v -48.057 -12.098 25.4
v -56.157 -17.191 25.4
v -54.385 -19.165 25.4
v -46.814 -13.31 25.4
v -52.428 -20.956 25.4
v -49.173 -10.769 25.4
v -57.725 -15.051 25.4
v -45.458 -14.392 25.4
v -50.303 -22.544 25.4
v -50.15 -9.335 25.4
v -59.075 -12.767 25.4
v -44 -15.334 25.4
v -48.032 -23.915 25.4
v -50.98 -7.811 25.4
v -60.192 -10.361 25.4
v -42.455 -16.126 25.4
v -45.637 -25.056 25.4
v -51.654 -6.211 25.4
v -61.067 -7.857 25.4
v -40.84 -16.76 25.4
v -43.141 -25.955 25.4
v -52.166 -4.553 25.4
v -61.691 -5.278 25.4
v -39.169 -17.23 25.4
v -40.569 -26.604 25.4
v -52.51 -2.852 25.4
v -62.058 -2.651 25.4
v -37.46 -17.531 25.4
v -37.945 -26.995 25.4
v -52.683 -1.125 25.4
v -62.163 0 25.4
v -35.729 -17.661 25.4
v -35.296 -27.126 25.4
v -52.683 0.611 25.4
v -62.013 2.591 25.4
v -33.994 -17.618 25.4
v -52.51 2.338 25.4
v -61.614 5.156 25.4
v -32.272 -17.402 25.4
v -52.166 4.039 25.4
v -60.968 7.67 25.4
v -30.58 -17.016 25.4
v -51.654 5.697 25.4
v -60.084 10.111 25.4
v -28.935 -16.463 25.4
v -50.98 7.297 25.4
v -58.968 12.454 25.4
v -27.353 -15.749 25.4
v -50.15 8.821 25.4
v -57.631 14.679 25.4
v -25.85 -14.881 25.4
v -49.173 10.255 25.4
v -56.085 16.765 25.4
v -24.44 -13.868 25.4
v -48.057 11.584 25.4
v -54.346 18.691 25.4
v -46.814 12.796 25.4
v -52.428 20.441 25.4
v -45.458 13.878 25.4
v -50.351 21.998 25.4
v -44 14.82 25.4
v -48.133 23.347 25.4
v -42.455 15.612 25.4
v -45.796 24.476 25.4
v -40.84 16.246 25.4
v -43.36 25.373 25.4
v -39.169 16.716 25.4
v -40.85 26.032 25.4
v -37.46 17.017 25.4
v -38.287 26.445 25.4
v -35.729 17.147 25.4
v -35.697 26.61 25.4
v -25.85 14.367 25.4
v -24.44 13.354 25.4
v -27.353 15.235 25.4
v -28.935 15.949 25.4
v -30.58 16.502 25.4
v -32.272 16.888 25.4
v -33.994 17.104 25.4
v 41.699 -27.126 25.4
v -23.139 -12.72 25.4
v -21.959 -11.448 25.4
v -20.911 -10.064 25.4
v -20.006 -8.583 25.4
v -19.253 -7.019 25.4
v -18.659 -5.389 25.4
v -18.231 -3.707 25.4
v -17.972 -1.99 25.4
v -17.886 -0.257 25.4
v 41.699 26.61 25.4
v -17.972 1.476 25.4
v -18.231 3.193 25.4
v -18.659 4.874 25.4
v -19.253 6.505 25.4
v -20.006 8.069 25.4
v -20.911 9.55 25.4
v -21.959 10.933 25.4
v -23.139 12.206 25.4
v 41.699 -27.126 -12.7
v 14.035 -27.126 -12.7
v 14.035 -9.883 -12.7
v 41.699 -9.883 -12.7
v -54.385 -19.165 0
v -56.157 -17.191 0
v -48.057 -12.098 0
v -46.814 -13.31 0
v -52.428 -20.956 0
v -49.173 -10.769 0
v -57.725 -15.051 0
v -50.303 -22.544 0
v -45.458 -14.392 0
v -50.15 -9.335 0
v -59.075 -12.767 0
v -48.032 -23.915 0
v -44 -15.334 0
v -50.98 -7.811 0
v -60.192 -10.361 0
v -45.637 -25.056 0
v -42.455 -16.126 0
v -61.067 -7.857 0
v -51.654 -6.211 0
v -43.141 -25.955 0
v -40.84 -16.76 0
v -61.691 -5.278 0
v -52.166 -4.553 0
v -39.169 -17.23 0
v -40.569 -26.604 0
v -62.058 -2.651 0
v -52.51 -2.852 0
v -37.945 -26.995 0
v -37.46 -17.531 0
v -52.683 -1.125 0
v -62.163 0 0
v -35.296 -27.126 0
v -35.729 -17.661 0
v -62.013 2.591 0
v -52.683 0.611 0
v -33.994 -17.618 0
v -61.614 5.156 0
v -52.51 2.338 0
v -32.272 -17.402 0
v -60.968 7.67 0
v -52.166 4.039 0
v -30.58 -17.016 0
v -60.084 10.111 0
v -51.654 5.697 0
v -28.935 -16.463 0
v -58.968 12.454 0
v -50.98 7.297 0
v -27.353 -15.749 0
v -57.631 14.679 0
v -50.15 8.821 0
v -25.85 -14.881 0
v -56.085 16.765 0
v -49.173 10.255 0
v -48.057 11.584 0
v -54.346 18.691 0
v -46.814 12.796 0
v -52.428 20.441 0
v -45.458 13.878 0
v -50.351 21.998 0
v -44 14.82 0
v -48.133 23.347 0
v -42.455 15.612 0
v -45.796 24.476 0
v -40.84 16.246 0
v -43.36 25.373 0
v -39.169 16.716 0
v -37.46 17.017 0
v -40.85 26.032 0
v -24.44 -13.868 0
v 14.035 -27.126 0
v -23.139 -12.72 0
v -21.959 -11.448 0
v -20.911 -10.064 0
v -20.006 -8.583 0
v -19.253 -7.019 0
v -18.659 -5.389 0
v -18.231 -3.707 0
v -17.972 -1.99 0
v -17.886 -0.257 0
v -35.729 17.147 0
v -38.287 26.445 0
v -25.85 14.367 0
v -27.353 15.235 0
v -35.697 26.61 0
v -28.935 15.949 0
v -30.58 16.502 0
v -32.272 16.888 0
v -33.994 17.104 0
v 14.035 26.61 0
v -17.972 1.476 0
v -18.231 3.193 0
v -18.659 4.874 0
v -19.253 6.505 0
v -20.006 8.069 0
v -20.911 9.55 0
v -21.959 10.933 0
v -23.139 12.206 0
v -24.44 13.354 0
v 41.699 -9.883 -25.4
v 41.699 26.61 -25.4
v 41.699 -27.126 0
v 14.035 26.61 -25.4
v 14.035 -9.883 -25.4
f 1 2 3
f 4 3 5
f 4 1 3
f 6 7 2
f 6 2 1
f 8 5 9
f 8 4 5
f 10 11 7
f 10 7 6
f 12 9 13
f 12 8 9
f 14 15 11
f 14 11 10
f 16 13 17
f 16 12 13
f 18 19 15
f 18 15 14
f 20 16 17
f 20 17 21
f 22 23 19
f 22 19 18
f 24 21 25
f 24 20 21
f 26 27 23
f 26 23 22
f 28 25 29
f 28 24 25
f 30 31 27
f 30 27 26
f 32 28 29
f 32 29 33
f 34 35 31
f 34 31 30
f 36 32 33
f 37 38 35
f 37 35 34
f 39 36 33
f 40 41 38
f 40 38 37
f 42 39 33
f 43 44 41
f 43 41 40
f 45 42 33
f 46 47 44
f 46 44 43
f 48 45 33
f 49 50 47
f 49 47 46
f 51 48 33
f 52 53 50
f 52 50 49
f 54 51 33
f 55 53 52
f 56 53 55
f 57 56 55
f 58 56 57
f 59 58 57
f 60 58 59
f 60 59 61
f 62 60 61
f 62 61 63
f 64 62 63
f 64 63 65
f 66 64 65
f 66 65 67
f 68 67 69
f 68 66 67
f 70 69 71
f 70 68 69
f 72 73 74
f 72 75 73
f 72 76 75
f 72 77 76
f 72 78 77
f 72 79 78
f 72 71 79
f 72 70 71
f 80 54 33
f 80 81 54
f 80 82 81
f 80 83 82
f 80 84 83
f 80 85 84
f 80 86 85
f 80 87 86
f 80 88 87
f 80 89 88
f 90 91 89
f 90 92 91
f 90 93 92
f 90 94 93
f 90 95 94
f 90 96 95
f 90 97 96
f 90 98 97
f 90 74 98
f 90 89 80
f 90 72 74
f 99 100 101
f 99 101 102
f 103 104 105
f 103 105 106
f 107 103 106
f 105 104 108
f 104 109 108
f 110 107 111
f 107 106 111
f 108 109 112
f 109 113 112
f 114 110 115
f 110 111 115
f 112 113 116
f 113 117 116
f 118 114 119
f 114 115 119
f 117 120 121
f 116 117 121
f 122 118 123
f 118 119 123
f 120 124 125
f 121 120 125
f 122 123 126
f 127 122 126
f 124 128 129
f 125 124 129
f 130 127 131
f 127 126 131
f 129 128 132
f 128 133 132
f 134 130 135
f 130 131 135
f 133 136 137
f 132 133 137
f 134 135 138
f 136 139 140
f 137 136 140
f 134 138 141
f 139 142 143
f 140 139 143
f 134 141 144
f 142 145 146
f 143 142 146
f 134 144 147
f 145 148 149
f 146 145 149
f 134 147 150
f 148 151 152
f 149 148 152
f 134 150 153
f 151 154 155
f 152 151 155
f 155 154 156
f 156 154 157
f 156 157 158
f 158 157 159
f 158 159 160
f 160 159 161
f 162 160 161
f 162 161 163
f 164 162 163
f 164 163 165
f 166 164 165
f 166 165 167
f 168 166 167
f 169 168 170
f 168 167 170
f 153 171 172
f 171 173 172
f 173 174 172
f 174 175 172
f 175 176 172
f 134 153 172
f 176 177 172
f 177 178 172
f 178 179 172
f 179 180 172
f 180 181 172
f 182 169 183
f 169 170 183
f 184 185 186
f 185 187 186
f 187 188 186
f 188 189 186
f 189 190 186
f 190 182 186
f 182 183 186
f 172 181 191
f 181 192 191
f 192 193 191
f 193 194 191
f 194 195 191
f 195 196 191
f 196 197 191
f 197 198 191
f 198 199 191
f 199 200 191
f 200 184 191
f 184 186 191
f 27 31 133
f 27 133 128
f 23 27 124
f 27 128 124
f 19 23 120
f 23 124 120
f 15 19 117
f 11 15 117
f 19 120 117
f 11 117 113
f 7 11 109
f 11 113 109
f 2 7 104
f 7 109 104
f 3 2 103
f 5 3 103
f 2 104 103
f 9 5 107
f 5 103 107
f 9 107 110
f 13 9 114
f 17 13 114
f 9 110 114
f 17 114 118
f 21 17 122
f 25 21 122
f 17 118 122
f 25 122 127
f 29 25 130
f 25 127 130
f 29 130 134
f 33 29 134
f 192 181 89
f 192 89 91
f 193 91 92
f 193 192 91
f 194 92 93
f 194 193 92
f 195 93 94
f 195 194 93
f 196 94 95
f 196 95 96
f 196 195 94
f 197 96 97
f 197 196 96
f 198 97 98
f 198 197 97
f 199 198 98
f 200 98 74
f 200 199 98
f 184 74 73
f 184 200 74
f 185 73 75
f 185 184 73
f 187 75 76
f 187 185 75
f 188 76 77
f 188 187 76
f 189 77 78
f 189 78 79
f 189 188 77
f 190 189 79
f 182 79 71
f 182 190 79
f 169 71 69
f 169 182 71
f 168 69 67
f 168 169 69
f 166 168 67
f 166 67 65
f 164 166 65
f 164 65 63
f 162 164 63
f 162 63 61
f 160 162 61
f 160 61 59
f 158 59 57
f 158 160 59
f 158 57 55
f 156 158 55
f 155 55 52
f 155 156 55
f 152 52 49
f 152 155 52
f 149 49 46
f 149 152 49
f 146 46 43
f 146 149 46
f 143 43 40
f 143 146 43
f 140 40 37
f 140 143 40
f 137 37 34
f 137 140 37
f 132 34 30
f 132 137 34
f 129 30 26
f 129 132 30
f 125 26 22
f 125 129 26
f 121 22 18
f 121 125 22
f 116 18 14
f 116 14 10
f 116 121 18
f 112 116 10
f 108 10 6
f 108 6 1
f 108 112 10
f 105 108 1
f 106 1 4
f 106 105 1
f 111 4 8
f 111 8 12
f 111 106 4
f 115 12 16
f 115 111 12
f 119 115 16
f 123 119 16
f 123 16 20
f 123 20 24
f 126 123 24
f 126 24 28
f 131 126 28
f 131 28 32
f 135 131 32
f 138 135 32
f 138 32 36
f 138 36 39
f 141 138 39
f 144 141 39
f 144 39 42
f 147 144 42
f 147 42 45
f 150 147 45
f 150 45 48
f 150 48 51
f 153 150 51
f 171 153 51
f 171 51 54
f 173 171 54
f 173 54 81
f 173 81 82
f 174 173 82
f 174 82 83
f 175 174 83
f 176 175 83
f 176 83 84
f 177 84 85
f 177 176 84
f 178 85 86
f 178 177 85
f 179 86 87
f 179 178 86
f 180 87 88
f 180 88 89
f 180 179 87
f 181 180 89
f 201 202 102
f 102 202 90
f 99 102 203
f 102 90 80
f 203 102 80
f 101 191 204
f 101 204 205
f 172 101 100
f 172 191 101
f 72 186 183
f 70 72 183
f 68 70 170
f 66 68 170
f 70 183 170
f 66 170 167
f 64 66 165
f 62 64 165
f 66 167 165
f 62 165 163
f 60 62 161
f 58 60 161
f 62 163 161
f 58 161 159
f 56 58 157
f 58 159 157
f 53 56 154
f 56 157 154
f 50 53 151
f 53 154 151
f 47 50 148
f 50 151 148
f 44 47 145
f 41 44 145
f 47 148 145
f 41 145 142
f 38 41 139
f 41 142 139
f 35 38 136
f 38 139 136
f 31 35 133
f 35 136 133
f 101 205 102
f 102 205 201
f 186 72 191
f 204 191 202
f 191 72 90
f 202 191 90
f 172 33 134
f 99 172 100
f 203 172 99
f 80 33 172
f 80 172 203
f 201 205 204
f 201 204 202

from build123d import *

# Parameters (mm, degrees)
F0_R     = 17.4093828925
F1_DEPTH = 25.4
F2_W     = 27.6633873582
F2_H     = 53.7356156856
F3_DEPTH = 25.4
F4_W     = 27.6633873582
F4_H     = 17.2435138375
F5_DEPTH = 12.7


with BuildPart() as f1:
    # F0 (on Top) → F1 (new body)
    with BuildSketch(Plane.XY):
        with BuildLine():
            ThreePointArc((-62.1633082628, 0), (-54.3854373577, -19.1652168316), (-35.2955013514, -27.1260682493))
            Line((-35.2955013514, -27.1260682493), (41.6988097131, -27.1260682493))
            Line((41.6988097131, -27.1260682493), (41.6988097131, 26.6095474362))
            Line((41.6988097131, 26.6095474362), (-35.6965139508, 26.6095474362))
            ThreePointArc((-35.6965139508, 26.6095474362), (-54.3456505922, 18.6914592057), (-62.1633082628, 0))
        make_face()
        with Locations((-35.2949523061, -0.2570371656)):
            Circle(F0_R, mode=Mode.SUBTRACT)
    extrude(amount=F1_DEPTH)

    # F2 (on face) → F3 (join)
    with BuildSketch(Plane(origin=(0, 0, 0), x_dir=(1, 0, 0), z_dir=(0, 0, -1))):
        with Locations((27.867116034, 0.2582604066)):
            Rectangle(F2_W, F2_H)
    extrude(amount=F3_DEPTH)

    # F4 (on face) → F5 (cut)
    with BuildSketch(Plane(origin=(0, 0, -25.4), x_dir=(1, 0, 0), z_dir=(0, 0, -1))):
        with Locations((27.867116034, 18.5043113306)):
            Rectangle(F4_W, F4_H)
    extrude(amount=-F5_DEPTH, mode=Mode.SUBTRACT)


solid = f1.part
